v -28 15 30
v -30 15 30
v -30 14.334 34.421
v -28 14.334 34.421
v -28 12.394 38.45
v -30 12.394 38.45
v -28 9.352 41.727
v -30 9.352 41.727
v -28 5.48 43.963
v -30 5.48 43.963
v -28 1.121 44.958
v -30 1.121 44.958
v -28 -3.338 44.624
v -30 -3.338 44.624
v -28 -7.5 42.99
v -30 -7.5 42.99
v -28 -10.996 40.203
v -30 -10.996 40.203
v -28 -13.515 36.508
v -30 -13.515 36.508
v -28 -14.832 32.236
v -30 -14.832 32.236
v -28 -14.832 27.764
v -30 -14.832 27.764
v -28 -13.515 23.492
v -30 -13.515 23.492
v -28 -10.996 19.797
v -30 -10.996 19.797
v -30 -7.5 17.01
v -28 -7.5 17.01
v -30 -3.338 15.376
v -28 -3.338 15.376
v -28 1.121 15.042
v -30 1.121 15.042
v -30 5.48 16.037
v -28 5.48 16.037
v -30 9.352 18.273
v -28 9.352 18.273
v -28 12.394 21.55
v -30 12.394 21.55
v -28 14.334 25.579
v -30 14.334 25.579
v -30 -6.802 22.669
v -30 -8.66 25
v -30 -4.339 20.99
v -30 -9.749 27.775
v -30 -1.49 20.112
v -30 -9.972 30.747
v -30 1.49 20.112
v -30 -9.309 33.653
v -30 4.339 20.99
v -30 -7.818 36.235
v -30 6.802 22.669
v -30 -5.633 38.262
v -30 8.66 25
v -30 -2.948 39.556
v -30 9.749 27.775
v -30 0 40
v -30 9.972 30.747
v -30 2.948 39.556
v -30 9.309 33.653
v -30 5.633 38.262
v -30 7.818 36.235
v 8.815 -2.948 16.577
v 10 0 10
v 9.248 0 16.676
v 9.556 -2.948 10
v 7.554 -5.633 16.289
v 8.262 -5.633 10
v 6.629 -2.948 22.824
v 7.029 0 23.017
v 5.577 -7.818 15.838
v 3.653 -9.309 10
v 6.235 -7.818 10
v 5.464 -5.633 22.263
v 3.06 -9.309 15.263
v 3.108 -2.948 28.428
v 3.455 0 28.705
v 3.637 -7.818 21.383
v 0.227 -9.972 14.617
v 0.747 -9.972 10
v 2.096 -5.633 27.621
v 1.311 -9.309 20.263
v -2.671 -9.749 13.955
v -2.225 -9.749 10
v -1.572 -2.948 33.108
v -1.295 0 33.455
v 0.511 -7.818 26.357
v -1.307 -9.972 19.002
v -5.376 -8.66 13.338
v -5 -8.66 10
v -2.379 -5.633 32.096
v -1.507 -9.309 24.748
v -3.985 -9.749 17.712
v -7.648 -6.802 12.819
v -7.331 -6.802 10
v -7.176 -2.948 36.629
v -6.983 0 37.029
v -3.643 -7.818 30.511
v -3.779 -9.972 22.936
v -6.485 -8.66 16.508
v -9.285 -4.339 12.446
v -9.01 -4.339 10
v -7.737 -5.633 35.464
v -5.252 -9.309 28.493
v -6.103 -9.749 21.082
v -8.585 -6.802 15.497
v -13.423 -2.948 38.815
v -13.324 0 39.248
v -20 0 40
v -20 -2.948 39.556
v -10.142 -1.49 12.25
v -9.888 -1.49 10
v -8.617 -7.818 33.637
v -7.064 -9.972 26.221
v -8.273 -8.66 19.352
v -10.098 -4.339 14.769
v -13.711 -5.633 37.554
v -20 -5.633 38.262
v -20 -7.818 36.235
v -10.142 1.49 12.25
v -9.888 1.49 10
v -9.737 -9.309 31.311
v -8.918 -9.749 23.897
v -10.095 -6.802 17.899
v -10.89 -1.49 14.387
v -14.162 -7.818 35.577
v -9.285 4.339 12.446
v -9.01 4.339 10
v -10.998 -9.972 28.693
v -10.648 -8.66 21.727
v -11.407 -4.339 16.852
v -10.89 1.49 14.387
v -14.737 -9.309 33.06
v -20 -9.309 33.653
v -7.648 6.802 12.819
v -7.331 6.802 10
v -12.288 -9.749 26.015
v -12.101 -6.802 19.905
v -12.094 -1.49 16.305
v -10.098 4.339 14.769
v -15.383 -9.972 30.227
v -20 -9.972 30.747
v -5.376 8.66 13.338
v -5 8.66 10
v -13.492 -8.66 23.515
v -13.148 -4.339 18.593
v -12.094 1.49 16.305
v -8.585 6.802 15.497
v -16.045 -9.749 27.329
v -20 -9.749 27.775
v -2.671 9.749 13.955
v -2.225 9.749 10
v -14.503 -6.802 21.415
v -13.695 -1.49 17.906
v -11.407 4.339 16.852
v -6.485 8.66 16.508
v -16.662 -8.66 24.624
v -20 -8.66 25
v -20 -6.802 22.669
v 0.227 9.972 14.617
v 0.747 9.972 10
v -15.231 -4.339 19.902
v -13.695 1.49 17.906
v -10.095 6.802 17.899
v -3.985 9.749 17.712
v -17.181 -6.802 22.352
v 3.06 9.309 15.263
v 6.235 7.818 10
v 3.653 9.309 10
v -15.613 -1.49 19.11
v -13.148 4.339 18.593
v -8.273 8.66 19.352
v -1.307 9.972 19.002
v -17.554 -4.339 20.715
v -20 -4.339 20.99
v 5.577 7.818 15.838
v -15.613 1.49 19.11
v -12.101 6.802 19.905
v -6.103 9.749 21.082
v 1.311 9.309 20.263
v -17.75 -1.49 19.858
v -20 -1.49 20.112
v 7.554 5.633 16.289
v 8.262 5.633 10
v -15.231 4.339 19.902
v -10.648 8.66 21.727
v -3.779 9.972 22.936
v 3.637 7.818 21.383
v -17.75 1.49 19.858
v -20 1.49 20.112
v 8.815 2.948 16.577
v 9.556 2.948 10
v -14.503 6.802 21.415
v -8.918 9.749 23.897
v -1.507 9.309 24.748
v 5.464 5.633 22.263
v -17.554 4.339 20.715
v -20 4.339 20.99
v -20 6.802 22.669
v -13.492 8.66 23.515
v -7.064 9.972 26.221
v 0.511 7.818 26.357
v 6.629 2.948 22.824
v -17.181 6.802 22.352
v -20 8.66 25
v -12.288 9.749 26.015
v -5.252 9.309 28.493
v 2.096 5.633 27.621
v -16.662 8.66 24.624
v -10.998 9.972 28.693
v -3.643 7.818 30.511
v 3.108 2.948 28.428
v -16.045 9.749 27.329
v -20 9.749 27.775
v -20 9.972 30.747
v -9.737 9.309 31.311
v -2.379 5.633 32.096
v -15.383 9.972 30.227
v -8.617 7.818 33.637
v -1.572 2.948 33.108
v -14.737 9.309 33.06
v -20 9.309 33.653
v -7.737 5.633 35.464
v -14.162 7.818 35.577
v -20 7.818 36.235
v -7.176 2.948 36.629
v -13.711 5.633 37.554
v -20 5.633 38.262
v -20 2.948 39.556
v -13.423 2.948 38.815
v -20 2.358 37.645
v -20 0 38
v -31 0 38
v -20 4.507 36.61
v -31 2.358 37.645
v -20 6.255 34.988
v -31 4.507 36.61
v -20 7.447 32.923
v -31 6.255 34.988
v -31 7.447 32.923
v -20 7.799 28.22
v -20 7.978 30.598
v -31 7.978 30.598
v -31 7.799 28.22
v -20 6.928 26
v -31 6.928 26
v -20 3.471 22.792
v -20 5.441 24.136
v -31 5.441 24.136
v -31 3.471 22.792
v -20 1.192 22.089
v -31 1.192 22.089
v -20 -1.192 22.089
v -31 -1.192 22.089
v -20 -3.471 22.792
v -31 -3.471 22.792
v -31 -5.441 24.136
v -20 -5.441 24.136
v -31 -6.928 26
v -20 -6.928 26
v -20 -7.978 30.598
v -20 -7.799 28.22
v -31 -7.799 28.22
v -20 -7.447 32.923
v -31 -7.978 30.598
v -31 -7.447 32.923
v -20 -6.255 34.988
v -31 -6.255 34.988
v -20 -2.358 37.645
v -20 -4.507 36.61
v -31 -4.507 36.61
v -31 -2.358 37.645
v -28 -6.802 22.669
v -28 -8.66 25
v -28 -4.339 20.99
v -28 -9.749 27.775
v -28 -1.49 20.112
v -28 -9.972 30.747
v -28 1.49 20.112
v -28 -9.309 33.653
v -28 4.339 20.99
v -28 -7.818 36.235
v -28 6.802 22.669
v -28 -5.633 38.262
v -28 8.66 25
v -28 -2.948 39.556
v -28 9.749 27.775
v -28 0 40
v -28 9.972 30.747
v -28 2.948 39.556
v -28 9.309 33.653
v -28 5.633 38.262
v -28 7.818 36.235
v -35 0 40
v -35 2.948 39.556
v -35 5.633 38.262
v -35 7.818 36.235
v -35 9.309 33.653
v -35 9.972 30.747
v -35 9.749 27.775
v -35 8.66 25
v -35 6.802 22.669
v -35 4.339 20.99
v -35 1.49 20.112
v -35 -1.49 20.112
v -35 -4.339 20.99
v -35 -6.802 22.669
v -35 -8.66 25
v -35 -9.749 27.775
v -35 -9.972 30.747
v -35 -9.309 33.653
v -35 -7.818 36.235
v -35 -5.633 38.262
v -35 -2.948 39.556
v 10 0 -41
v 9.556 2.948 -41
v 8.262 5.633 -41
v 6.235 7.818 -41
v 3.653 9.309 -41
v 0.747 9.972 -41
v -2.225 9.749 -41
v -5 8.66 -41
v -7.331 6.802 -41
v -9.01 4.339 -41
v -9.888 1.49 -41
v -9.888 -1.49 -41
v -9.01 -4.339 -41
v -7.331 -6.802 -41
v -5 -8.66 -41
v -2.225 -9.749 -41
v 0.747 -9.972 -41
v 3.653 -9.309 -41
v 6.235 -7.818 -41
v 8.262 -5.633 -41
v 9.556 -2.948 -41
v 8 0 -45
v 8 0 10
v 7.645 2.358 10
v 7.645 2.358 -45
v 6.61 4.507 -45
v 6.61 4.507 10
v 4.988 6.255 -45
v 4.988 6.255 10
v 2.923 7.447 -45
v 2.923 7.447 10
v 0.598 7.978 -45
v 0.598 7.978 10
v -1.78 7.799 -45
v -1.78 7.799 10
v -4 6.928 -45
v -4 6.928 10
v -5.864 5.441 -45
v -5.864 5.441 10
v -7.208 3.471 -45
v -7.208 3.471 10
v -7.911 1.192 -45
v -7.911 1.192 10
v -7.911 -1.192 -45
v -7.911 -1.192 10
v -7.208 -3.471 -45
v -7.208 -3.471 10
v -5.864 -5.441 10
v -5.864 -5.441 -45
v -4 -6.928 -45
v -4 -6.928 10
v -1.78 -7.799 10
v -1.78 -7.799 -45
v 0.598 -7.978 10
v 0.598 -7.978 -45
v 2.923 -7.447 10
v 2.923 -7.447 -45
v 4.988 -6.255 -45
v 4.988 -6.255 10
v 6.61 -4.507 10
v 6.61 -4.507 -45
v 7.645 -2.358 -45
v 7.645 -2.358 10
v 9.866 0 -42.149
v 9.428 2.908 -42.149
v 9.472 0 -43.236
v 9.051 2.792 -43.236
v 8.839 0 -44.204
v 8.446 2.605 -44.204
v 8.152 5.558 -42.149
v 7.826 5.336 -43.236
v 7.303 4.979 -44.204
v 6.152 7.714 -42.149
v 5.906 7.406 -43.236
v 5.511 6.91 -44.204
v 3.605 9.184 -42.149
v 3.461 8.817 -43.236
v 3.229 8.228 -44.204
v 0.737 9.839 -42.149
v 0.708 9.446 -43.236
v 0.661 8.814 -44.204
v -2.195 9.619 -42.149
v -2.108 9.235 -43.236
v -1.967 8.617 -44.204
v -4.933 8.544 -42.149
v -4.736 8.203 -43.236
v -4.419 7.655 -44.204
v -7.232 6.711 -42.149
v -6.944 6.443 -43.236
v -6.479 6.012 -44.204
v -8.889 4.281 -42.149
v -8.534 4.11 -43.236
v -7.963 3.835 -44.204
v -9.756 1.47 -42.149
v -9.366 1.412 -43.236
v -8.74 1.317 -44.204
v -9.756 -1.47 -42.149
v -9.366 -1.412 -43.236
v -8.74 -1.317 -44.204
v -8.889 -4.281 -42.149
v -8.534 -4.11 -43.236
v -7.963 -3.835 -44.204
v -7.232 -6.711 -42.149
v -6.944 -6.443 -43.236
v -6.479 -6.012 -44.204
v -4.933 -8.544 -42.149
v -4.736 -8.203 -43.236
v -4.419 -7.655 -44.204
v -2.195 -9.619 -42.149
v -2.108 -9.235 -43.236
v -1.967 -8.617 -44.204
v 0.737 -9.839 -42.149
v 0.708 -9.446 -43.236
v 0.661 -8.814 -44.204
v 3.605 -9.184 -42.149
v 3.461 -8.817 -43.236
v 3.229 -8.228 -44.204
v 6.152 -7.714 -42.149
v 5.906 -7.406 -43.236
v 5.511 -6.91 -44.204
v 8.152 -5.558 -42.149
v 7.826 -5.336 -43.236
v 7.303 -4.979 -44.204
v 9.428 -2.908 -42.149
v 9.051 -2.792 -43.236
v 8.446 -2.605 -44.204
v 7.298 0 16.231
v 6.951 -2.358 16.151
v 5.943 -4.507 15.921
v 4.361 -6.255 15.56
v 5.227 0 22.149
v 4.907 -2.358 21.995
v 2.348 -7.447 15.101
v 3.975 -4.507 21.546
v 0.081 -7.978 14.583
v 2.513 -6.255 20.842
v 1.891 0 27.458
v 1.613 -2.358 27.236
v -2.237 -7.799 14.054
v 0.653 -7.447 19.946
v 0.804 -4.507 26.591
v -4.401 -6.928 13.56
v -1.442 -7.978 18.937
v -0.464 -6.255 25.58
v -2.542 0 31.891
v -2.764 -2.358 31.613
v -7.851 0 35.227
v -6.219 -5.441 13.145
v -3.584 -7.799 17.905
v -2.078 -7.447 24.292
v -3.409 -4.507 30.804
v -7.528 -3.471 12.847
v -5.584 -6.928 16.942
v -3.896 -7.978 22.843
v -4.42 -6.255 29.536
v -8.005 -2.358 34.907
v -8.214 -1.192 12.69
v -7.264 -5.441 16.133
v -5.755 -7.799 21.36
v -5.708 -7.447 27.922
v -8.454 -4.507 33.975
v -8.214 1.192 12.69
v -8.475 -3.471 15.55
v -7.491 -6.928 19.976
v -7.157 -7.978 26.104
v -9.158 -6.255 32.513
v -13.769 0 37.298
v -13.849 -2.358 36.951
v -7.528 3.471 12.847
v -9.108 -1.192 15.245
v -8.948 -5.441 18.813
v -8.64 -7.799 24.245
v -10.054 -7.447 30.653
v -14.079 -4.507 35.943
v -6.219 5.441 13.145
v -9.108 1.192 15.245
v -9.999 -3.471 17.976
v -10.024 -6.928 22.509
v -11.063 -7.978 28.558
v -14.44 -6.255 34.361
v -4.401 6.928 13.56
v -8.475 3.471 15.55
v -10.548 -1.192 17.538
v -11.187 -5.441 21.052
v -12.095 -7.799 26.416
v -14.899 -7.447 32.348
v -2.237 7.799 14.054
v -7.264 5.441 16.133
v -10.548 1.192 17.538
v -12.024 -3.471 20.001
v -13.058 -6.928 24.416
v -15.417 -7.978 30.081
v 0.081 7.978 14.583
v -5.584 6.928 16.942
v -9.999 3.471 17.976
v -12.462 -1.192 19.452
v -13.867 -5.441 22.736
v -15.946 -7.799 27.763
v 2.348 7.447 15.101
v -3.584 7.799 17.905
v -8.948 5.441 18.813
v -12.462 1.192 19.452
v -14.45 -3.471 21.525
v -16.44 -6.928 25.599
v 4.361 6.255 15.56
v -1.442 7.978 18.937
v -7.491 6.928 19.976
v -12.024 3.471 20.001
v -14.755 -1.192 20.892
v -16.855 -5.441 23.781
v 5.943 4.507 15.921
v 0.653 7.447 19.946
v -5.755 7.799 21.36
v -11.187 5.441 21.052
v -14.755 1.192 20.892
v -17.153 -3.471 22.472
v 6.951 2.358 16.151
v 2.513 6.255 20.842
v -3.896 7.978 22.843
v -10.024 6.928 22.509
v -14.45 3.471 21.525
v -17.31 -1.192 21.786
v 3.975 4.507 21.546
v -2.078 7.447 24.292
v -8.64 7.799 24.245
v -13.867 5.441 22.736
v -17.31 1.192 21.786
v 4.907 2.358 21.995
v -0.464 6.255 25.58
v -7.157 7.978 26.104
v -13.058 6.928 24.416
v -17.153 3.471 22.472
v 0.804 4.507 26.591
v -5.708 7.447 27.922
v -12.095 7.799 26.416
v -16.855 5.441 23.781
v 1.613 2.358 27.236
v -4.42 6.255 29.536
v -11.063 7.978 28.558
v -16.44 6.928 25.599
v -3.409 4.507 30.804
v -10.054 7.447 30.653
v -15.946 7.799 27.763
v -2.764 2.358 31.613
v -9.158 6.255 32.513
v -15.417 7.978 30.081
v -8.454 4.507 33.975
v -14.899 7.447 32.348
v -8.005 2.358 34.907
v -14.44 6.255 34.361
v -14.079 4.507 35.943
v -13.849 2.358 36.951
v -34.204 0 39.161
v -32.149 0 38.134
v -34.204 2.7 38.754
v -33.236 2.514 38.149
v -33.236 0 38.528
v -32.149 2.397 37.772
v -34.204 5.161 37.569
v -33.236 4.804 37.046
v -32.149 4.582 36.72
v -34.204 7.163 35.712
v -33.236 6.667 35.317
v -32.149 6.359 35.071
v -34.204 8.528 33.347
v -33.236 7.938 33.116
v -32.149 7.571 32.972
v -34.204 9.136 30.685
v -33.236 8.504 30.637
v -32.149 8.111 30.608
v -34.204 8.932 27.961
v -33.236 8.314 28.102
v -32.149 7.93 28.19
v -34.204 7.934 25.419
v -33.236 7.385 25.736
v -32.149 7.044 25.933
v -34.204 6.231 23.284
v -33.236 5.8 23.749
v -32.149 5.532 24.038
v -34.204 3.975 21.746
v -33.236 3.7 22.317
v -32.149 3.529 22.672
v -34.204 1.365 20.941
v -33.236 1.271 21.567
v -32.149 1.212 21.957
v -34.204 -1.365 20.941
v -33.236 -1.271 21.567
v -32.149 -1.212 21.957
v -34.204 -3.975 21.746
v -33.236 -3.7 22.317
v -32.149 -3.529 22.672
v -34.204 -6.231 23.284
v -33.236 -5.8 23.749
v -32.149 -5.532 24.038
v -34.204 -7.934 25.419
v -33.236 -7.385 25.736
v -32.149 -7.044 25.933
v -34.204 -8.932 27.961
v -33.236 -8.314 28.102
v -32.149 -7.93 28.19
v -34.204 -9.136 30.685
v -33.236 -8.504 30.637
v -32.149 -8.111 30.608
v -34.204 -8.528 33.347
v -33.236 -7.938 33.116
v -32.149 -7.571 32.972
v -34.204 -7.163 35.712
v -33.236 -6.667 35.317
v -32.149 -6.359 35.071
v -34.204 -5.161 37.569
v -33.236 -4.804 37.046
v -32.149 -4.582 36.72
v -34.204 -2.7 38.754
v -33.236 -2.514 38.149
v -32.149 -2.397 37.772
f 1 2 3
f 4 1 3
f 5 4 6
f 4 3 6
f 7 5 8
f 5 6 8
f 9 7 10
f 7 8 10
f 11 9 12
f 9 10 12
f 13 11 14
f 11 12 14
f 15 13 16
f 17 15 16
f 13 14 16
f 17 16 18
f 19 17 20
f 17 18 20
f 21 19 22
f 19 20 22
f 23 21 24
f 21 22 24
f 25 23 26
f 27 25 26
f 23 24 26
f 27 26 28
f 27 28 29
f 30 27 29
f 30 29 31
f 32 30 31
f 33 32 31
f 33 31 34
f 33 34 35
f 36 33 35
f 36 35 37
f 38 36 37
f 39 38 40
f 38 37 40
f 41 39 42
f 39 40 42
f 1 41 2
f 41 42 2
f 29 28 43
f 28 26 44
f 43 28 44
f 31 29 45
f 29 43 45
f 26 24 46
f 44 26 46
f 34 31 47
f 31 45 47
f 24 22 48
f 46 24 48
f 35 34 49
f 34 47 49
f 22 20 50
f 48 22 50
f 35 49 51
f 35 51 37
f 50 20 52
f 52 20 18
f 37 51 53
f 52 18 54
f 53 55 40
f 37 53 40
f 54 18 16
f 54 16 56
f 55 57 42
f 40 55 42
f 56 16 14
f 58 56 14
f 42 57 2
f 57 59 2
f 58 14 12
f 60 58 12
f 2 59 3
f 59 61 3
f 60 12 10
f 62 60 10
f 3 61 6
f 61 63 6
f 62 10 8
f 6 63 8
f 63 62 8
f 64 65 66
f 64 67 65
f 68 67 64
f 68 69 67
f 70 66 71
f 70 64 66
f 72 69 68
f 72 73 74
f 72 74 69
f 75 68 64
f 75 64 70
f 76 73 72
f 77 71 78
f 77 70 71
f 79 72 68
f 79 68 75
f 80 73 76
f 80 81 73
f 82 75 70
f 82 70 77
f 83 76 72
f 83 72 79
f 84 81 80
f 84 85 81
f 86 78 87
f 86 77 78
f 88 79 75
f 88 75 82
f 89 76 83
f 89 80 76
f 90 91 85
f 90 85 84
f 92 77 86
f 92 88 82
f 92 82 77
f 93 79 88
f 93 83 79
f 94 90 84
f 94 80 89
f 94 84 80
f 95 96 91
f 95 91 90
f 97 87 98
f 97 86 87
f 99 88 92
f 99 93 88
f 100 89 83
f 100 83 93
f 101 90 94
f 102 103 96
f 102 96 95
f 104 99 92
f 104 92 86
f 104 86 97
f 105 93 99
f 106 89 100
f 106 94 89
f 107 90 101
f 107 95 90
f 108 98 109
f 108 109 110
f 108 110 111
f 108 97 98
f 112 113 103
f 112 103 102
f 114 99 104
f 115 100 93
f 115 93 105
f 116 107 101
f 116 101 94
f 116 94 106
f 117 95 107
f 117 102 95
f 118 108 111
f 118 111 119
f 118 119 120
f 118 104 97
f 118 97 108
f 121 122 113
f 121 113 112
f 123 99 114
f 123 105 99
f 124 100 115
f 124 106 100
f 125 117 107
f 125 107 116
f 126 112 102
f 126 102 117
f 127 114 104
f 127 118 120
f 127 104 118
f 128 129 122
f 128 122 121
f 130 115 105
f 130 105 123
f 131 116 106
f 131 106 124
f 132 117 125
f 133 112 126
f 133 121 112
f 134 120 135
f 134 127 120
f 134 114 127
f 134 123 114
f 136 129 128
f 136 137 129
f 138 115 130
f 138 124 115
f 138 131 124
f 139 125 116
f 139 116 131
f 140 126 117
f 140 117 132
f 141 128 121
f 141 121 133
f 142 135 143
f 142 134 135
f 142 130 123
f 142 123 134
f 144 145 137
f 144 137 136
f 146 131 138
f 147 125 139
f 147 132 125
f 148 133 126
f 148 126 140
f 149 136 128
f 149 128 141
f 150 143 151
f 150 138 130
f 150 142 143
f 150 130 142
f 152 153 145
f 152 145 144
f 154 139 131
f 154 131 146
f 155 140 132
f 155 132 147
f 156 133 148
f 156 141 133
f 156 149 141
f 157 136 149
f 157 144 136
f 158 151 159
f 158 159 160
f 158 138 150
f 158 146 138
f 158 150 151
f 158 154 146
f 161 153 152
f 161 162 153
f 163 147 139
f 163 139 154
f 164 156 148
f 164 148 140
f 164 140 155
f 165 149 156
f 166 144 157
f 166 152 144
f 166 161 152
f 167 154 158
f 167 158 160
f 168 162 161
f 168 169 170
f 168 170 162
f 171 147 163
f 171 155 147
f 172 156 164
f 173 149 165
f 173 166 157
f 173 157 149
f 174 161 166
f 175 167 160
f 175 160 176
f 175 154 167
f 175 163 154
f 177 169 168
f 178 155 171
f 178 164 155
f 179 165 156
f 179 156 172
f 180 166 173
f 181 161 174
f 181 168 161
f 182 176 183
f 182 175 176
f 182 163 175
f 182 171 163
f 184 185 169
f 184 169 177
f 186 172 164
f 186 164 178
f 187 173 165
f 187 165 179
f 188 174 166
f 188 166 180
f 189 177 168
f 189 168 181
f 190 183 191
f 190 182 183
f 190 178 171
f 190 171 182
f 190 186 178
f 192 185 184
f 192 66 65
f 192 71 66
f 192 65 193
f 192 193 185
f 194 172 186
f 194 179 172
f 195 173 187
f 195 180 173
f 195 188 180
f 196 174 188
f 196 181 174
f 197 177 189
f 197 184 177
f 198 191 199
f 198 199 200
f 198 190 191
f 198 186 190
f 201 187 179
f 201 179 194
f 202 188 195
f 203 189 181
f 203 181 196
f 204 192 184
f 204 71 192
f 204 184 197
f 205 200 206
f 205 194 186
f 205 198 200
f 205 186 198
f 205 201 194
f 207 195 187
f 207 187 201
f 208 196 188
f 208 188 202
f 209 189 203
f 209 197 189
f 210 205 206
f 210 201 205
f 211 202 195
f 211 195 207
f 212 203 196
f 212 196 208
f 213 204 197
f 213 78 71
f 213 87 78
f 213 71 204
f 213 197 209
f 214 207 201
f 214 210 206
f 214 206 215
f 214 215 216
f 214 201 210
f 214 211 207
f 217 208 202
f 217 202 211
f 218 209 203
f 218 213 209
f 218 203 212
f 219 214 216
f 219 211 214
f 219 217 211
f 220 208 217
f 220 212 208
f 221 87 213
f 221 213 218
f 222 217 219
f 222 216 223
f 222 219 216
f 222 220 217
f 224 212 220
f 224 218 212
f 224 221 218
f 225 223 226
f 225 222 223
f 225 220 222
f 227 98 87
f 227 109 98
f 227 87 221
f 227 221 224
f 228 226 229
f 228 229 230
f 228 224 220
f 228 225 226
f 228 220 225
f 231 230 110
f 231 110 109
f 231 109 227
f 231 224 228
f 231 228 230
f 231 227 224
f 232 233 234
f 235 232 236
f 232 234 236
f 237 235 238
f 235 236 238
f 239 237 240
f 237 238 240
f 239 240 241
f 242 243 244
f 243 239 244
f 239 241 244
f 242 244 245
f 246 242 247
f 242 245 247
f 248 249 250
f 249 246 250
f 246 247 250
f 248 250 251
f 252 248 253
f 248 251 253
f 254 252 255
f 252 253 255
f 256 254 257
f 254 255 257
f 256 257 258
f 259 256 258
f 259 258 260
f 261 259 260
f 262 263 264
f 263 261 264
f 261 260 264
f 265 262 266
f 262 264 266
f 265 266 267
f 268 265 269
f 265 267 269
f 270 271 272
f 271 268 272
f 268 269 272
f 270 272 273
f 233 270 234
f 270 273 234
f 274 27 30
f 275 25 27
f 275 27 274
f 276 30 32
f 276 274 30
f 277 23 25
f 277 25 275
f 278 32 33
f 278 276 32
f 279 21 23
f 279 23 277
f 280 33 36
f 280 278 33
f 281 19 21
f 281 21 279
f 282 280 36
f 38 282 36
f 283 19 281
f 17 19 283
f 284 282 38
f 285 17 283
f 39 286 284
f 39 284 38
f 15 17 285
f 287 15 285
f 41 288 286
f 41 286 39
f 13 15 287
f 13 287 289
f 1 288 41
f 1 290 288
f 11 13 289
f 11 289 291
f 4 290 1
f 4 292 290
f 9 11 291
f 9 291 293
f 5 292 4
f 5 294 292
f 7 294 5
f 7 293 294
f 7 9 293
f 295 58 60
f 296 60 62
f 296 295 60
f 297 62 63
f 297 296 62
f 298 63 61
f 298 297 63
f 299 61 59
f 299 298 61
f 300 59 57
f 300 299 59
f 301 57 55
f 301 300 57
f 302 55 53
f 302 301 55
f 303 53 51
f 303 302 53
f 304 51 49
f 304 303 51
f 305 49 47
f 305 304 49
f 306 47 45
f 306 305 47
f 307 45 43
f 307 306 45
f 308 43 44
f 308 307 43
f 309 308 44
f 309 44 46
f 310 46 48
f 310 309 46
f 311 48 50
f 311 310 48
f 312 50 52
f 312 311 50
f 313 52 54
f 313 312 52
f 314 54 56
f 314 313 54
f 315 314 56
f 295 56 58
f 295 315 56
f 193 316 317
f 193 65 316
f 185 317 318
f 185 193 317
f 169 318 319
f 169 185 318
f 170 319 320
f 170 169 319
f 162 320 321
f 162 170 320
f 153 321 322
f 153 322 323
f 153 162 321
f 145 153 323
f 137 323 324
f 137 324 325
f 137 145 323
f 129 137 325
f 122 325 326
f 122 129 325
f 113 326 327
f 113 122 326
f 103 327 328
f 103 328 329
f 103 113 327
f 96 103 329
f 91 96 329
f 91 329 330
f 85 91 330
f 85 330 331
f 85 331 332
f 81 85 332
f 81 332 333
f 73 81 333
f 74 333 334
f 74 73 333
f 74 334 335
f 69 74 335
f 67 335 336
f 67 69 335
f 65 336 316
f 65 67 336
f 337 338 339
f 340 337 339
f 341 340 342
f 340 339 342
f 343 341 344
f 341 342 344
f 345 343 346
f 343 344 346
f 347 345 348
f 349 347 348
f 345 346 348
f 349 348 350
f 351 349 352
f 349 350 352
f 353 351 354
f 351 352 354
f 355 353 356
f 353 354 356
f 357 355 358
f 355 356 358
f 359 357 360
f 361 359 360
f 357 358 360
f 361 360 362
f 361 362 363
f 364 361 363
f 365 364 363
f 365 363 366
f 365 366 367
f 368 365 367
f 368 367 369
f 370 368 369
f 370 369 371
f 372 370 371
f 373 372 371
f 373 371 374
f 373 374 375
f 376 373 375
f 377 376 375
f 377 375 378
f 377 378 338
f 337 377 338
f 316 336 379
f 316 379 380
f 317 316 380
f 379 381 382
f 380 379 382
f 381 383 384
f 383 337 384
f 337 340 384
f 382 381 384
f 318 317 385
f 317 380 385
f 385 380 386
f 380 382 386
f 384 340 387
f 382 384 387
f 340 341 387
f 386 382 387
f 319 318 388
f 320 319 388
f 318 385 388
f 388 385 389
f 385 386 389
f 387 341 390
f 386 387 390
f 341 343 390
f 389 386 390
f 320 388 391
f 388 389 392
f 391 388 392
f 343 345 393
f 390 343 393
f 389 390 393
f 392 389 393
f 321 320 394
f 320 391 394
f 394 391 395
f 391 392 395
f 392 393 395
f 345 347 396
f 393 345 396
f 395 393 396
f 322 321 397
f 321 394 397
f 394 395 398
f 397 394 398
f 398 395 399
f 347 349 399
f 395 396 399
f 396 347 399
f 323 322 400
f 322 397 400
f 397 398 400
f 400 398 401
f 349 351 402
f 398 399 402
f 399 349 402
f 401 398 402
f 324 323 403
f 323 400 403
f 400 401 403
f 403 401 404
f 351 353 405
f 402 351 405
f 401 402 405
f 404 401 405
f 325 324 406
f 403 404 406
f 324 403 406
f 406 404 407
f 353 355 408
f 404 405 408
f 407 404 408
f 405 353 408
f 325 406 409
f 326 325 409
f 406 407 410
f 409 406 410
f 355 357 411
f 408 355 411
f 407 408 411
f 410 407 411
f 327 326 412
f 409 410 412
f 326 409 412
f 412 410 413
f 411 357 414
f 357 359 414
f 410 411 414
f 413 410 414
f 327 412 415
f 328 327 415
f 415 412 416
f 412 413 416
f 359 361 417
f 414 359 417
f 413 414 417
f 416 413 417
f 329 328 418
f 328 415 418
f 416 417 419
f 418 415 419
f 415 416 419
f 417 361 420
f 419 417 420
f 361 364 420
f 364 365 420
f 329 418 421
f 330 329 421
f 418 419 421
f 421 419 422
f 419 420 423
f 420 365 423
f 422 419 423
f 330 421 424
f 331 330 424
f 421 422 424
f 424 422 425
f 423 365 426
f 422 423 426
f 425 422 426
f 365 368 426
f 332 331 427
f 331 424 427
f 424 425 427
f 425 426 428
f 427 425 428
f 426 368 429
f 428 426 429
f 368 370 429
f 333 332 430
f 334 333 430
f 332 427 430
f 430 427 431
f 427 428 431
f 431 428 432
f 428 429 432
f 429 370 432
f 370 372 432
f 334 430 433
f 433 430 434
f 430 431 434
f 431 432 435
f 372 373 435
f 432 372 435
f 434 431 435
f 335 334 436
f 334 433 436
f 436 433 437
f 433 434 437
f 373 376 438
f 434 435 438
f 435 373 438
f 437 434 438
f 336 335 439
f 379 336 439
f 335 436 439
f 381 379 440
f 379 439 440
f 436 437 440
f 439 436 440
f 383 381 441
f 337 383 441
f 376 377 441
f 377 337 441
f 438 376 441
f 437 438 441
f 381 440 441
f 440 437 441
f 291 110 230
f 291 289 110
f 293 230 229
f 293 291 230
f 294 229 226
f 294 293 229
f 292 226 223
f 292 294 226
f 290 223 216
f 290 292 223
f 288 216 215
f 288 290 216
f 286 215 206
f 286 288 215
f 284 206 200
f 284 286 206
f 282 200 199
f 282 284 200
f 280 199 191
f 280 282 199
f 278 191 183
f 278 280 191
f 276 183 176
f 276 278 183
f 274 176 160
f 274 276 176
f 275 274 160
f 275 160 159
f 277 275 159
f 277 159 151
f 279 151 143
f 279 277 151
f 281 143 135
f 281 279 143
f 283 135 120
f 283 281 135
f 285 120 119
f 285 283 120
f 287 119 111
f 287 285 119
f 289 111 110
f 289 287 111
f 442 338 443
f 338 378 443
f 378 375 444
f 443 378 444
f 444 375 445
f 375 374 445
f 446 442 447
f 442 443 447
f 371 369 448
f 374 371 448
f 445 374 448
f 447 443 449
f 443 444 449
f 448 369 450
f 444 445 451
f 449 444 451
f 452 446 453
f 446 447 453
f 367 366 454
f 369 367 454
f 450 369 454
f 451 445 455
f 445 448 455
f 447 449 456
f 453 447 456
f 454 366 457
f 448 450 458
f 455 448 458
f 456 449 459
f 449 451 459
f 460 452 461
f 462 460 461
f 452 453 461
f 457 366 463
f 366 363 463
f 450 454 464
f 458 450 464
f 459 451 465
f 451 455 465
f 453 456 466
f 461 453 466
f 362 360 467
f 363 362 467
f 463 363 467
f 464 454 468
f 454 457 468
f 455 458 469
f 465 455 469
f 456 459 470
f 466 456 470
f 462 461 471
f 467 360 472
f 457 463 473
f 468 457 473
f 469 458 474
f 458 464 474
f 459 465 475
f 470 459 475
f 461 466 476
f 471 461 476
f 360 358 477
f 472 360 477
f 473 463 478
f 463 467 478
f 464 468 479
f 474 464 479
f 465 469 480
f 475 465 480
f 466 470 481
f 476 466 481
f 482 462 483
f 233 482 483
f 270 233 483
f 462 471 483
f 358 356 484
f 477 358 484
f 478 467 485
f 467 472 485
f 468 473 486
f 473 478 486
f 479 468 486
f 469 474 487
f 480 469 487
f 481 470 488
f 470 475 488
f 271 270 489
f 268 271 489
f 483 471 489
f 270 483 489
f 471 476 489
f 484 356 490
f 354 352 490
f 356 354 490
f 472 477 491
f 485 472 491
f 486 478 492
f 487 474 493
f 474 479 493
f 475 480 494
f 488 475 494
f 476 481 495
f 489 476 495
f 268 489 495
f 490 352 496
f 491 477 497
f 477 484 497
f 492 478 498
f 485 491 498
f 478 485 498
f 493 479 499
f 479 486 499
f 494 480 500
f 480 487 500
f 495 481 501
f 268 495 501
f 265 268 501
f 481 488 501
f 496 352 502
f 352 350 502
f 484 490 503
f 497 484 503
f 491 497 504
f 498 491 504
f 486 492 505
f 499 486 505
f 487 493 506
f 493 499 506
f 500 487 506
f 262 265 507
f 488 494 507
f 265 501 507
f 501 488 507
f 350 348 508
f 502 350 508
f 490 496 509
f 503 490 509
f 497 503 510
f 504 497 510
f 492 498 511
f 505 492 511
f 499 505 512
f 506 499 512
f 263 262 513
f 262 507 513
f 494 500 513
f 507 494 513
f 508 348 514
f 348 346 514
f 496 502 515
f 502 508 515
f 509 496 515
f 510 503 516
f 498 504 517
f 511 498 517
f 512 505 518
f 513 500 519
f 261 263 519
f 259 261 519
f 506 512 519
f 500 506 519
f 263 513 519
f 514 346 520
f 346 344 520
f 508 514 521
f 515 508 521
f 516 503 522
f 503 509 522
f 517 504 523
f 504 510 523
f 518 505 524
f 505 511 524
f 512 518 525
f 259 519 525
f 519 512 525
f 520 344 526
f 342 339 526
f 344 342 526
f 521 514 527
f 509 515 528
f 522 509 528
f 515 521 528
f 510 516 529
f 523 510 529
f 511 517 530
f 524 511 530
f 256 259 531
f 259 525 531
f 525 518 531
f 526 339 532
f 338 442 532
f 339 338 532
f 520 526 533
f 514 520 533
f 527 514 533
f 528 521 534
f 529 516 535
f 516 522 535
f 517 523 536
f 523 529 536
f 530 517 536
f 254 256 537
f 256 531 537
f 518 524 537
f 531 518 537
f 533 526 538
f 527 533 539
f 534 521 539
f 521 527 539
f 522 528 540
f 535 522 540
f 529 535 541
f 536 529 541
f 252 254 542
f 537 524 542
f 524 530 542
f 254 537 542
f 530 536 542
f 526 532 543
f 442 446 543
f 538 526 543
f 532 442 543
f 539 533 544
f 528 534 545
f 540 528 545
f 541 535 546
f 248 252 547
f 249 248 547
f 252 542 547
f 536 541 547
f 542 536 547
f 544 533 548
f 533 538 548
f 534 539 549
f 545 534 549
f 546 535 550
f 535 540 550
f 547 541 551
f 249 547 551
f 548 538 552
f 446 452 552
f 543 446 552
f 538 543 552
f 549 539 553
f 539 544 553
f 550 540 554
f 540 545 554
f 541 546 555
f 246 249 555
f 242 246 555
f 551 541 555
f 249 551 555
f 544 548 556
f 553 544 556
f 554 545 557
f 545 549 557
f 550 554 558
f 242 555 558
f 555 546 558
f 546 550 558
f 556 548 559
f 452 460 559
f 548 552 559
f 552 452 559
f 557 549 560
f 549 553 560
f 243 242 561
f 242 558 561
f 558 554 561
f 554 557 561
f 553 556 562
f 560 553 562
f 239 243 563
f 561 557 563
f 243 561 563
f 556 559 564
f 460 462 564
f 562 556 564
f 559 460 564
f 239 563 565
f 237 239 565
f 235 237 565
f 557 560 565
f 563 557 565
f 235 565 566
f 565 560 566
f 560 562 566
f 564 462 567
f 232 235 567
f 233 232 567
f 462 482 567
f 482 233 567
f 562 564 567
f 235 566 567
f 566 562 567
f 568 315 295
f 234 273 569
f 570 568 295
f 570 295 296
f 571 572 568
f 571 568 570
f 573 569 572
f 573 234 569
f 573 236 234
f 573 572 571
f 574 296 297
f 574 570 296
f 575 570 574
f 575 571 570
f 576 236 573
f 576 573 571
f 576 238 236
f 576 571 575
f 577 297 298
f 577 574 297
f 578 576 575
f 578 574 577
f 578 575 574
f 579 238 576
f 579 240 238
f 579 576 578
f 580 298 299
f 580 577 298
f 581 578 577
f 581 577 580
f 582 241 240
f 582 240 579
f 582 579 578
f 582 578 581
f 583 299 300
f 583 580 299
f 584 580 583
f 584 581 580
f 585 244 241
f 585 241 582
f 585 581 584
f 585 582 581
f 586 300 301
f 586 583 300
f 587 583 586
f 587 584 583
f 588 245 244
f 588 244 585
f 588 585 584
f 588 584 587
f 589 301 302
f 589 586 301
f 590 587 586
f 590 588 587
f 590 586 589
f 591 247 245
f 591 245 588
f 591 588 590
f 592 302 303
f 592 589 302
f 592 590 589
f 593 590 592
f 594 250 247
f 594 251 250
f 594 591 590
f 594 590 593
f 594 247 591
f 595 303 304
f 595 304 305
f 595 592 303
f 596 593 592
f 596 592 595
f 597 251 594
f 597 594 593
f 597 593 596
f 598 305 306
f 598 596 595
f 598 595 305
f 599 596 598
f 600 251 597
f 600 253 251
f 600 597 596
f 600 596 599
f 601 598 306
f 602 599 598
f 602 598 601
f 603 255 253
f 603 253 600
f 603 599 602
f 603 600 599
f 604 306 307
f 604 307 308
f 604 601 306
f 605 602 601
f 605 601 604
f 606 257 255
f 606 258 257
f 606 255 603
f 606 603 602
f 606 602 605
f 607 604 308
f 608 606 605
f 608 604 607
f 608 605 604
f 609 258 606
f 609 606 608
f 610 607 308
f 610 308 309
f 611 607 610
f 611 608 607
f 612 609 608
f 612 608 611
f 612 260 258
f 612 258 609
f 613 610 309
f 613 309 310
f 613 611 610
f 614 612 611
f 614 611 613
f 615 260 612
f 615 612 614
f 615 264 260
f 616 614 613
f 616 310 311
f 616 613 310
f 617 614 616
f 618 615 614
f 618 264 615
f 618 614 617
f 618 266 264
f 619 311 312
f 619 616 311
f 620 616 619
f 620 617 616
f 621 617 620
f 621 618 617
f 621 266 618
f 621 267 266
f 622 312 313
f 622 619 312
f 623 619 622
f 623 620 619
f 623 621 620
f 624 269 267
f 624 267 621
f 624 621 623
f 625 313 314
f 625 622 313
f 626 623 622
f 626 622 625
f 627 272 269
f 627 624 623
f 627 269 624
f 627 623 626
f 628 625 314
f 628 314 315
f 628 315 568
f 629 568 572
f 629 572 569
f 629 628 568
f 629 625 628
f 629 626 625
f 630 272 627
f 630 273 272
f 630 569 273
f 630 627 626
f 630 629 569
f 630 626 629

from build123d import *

# Parameters (mm, degrees)
F2_R     = 10
F2_R_2   = 8
F7_R     = 15
F7_R_2   = 10
F8_DEPTH = 2


# Not quite as in the source:
# - a fillet or chamfer that OpenCascade refuses, or shapes differently, is made with other operations: its cross-section is extruded or revolved along the edge and cut away or added


with BuildPart() as f3:
    # F3: sweep along a path in F0
    with BuildLine(Plane.XZ) as f3_path:
        Line((0, -45), (0, 10))
        ThreePointArc((0, 10), (-5.8578643763, 24.1421356237), (-20, 30))
        Line((-20, 30), (-35, 30))
    # F2 (on plane+point) → F3 (sweep)
    with BuildSketch(Plane.XY.offset(-45)):
        Circle(F2_R)
        Circle(F2_R_2, mode=Mode.SUBTRACT)
    sweep(path=f3_path.line)

    # F4: fillet of radius 5 on 1 edges, made by hand

    # F4_s1 → F4_t2 (revolve, cut)
    with BuildSketch(Plane.XZ):
        with BuildLine():
            ThreePointArc((10, -41), (9.472135955, -43.2360679775), (8, -45))
            Line((8, -45), (10, -45))
            Line((10, -45), (10, -41))
        make_face()
    revolve(axis=Axis((0, 0, -45), (0, 0, 1)), mode=Mode.SUBTRACT)

    # F5: fillet of radius 5 on 1 edges, made by hand

    # F5_s1 → F5_t2 (revolve, cut)
    with BuildSketch(Plane.XZ):
        with BuildLine():
            ThreePointArc((-35, 40), (-33.2360679775, 38.527864045), (-31, 38))
            Line((-31, 38), (-35, 38))
            Line((-35, 38), (-35, 40))
        make_face()
    revolve(axis=Axis((-35, 0, 30), (-1, 0, 0)), mode=Mode.SUBTRACT)

    # F7 (on offset) → F8 (join)
    with BuildSketch(Plane.YZ.offset(-30)):
        with Locations((0, 30)):
            Circle(F7_R)
        with Locations((0, 30)):
            Circle(F7_R_2, mode=Mode.SUBTRACT)
    extrude(amount=F8_DEPTH)


solid = f3.part
